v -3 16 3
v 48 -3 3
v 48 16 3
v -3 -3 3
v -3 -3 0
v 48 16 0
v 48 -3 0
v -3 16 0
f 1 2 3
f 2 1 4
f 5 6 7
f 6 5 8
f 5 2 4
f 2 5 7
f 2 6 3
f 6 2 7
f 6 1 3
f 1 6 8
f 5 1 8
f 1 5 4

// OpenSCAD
union() {
    // outer shell
    difference(){
        linear_extrude(height = 10, center = false, convexity = 10)import(file = "trace_ps1_controller_.dxf", layer = "shell_outside");
        linear_extrude(height = 12, center = false, convexity = 10)import(file = "trace_ps1_controller_.dxf", layer = "shell_inside");
    }
    // inner part for plugs
    difference(){
        linear_extrude(height = 8, center = false, convexity = 10) import(file = "trace_ps1_controller_.dxf", layer = "plug_outside");
        linear_extrude(height = 10, center = false, convexity = 10)import(file = "trace_ps1_controller_.dxf", layer = "plug_inside");
    }
    translate([-3,-3,0]) cube([51,19,3]);
}
